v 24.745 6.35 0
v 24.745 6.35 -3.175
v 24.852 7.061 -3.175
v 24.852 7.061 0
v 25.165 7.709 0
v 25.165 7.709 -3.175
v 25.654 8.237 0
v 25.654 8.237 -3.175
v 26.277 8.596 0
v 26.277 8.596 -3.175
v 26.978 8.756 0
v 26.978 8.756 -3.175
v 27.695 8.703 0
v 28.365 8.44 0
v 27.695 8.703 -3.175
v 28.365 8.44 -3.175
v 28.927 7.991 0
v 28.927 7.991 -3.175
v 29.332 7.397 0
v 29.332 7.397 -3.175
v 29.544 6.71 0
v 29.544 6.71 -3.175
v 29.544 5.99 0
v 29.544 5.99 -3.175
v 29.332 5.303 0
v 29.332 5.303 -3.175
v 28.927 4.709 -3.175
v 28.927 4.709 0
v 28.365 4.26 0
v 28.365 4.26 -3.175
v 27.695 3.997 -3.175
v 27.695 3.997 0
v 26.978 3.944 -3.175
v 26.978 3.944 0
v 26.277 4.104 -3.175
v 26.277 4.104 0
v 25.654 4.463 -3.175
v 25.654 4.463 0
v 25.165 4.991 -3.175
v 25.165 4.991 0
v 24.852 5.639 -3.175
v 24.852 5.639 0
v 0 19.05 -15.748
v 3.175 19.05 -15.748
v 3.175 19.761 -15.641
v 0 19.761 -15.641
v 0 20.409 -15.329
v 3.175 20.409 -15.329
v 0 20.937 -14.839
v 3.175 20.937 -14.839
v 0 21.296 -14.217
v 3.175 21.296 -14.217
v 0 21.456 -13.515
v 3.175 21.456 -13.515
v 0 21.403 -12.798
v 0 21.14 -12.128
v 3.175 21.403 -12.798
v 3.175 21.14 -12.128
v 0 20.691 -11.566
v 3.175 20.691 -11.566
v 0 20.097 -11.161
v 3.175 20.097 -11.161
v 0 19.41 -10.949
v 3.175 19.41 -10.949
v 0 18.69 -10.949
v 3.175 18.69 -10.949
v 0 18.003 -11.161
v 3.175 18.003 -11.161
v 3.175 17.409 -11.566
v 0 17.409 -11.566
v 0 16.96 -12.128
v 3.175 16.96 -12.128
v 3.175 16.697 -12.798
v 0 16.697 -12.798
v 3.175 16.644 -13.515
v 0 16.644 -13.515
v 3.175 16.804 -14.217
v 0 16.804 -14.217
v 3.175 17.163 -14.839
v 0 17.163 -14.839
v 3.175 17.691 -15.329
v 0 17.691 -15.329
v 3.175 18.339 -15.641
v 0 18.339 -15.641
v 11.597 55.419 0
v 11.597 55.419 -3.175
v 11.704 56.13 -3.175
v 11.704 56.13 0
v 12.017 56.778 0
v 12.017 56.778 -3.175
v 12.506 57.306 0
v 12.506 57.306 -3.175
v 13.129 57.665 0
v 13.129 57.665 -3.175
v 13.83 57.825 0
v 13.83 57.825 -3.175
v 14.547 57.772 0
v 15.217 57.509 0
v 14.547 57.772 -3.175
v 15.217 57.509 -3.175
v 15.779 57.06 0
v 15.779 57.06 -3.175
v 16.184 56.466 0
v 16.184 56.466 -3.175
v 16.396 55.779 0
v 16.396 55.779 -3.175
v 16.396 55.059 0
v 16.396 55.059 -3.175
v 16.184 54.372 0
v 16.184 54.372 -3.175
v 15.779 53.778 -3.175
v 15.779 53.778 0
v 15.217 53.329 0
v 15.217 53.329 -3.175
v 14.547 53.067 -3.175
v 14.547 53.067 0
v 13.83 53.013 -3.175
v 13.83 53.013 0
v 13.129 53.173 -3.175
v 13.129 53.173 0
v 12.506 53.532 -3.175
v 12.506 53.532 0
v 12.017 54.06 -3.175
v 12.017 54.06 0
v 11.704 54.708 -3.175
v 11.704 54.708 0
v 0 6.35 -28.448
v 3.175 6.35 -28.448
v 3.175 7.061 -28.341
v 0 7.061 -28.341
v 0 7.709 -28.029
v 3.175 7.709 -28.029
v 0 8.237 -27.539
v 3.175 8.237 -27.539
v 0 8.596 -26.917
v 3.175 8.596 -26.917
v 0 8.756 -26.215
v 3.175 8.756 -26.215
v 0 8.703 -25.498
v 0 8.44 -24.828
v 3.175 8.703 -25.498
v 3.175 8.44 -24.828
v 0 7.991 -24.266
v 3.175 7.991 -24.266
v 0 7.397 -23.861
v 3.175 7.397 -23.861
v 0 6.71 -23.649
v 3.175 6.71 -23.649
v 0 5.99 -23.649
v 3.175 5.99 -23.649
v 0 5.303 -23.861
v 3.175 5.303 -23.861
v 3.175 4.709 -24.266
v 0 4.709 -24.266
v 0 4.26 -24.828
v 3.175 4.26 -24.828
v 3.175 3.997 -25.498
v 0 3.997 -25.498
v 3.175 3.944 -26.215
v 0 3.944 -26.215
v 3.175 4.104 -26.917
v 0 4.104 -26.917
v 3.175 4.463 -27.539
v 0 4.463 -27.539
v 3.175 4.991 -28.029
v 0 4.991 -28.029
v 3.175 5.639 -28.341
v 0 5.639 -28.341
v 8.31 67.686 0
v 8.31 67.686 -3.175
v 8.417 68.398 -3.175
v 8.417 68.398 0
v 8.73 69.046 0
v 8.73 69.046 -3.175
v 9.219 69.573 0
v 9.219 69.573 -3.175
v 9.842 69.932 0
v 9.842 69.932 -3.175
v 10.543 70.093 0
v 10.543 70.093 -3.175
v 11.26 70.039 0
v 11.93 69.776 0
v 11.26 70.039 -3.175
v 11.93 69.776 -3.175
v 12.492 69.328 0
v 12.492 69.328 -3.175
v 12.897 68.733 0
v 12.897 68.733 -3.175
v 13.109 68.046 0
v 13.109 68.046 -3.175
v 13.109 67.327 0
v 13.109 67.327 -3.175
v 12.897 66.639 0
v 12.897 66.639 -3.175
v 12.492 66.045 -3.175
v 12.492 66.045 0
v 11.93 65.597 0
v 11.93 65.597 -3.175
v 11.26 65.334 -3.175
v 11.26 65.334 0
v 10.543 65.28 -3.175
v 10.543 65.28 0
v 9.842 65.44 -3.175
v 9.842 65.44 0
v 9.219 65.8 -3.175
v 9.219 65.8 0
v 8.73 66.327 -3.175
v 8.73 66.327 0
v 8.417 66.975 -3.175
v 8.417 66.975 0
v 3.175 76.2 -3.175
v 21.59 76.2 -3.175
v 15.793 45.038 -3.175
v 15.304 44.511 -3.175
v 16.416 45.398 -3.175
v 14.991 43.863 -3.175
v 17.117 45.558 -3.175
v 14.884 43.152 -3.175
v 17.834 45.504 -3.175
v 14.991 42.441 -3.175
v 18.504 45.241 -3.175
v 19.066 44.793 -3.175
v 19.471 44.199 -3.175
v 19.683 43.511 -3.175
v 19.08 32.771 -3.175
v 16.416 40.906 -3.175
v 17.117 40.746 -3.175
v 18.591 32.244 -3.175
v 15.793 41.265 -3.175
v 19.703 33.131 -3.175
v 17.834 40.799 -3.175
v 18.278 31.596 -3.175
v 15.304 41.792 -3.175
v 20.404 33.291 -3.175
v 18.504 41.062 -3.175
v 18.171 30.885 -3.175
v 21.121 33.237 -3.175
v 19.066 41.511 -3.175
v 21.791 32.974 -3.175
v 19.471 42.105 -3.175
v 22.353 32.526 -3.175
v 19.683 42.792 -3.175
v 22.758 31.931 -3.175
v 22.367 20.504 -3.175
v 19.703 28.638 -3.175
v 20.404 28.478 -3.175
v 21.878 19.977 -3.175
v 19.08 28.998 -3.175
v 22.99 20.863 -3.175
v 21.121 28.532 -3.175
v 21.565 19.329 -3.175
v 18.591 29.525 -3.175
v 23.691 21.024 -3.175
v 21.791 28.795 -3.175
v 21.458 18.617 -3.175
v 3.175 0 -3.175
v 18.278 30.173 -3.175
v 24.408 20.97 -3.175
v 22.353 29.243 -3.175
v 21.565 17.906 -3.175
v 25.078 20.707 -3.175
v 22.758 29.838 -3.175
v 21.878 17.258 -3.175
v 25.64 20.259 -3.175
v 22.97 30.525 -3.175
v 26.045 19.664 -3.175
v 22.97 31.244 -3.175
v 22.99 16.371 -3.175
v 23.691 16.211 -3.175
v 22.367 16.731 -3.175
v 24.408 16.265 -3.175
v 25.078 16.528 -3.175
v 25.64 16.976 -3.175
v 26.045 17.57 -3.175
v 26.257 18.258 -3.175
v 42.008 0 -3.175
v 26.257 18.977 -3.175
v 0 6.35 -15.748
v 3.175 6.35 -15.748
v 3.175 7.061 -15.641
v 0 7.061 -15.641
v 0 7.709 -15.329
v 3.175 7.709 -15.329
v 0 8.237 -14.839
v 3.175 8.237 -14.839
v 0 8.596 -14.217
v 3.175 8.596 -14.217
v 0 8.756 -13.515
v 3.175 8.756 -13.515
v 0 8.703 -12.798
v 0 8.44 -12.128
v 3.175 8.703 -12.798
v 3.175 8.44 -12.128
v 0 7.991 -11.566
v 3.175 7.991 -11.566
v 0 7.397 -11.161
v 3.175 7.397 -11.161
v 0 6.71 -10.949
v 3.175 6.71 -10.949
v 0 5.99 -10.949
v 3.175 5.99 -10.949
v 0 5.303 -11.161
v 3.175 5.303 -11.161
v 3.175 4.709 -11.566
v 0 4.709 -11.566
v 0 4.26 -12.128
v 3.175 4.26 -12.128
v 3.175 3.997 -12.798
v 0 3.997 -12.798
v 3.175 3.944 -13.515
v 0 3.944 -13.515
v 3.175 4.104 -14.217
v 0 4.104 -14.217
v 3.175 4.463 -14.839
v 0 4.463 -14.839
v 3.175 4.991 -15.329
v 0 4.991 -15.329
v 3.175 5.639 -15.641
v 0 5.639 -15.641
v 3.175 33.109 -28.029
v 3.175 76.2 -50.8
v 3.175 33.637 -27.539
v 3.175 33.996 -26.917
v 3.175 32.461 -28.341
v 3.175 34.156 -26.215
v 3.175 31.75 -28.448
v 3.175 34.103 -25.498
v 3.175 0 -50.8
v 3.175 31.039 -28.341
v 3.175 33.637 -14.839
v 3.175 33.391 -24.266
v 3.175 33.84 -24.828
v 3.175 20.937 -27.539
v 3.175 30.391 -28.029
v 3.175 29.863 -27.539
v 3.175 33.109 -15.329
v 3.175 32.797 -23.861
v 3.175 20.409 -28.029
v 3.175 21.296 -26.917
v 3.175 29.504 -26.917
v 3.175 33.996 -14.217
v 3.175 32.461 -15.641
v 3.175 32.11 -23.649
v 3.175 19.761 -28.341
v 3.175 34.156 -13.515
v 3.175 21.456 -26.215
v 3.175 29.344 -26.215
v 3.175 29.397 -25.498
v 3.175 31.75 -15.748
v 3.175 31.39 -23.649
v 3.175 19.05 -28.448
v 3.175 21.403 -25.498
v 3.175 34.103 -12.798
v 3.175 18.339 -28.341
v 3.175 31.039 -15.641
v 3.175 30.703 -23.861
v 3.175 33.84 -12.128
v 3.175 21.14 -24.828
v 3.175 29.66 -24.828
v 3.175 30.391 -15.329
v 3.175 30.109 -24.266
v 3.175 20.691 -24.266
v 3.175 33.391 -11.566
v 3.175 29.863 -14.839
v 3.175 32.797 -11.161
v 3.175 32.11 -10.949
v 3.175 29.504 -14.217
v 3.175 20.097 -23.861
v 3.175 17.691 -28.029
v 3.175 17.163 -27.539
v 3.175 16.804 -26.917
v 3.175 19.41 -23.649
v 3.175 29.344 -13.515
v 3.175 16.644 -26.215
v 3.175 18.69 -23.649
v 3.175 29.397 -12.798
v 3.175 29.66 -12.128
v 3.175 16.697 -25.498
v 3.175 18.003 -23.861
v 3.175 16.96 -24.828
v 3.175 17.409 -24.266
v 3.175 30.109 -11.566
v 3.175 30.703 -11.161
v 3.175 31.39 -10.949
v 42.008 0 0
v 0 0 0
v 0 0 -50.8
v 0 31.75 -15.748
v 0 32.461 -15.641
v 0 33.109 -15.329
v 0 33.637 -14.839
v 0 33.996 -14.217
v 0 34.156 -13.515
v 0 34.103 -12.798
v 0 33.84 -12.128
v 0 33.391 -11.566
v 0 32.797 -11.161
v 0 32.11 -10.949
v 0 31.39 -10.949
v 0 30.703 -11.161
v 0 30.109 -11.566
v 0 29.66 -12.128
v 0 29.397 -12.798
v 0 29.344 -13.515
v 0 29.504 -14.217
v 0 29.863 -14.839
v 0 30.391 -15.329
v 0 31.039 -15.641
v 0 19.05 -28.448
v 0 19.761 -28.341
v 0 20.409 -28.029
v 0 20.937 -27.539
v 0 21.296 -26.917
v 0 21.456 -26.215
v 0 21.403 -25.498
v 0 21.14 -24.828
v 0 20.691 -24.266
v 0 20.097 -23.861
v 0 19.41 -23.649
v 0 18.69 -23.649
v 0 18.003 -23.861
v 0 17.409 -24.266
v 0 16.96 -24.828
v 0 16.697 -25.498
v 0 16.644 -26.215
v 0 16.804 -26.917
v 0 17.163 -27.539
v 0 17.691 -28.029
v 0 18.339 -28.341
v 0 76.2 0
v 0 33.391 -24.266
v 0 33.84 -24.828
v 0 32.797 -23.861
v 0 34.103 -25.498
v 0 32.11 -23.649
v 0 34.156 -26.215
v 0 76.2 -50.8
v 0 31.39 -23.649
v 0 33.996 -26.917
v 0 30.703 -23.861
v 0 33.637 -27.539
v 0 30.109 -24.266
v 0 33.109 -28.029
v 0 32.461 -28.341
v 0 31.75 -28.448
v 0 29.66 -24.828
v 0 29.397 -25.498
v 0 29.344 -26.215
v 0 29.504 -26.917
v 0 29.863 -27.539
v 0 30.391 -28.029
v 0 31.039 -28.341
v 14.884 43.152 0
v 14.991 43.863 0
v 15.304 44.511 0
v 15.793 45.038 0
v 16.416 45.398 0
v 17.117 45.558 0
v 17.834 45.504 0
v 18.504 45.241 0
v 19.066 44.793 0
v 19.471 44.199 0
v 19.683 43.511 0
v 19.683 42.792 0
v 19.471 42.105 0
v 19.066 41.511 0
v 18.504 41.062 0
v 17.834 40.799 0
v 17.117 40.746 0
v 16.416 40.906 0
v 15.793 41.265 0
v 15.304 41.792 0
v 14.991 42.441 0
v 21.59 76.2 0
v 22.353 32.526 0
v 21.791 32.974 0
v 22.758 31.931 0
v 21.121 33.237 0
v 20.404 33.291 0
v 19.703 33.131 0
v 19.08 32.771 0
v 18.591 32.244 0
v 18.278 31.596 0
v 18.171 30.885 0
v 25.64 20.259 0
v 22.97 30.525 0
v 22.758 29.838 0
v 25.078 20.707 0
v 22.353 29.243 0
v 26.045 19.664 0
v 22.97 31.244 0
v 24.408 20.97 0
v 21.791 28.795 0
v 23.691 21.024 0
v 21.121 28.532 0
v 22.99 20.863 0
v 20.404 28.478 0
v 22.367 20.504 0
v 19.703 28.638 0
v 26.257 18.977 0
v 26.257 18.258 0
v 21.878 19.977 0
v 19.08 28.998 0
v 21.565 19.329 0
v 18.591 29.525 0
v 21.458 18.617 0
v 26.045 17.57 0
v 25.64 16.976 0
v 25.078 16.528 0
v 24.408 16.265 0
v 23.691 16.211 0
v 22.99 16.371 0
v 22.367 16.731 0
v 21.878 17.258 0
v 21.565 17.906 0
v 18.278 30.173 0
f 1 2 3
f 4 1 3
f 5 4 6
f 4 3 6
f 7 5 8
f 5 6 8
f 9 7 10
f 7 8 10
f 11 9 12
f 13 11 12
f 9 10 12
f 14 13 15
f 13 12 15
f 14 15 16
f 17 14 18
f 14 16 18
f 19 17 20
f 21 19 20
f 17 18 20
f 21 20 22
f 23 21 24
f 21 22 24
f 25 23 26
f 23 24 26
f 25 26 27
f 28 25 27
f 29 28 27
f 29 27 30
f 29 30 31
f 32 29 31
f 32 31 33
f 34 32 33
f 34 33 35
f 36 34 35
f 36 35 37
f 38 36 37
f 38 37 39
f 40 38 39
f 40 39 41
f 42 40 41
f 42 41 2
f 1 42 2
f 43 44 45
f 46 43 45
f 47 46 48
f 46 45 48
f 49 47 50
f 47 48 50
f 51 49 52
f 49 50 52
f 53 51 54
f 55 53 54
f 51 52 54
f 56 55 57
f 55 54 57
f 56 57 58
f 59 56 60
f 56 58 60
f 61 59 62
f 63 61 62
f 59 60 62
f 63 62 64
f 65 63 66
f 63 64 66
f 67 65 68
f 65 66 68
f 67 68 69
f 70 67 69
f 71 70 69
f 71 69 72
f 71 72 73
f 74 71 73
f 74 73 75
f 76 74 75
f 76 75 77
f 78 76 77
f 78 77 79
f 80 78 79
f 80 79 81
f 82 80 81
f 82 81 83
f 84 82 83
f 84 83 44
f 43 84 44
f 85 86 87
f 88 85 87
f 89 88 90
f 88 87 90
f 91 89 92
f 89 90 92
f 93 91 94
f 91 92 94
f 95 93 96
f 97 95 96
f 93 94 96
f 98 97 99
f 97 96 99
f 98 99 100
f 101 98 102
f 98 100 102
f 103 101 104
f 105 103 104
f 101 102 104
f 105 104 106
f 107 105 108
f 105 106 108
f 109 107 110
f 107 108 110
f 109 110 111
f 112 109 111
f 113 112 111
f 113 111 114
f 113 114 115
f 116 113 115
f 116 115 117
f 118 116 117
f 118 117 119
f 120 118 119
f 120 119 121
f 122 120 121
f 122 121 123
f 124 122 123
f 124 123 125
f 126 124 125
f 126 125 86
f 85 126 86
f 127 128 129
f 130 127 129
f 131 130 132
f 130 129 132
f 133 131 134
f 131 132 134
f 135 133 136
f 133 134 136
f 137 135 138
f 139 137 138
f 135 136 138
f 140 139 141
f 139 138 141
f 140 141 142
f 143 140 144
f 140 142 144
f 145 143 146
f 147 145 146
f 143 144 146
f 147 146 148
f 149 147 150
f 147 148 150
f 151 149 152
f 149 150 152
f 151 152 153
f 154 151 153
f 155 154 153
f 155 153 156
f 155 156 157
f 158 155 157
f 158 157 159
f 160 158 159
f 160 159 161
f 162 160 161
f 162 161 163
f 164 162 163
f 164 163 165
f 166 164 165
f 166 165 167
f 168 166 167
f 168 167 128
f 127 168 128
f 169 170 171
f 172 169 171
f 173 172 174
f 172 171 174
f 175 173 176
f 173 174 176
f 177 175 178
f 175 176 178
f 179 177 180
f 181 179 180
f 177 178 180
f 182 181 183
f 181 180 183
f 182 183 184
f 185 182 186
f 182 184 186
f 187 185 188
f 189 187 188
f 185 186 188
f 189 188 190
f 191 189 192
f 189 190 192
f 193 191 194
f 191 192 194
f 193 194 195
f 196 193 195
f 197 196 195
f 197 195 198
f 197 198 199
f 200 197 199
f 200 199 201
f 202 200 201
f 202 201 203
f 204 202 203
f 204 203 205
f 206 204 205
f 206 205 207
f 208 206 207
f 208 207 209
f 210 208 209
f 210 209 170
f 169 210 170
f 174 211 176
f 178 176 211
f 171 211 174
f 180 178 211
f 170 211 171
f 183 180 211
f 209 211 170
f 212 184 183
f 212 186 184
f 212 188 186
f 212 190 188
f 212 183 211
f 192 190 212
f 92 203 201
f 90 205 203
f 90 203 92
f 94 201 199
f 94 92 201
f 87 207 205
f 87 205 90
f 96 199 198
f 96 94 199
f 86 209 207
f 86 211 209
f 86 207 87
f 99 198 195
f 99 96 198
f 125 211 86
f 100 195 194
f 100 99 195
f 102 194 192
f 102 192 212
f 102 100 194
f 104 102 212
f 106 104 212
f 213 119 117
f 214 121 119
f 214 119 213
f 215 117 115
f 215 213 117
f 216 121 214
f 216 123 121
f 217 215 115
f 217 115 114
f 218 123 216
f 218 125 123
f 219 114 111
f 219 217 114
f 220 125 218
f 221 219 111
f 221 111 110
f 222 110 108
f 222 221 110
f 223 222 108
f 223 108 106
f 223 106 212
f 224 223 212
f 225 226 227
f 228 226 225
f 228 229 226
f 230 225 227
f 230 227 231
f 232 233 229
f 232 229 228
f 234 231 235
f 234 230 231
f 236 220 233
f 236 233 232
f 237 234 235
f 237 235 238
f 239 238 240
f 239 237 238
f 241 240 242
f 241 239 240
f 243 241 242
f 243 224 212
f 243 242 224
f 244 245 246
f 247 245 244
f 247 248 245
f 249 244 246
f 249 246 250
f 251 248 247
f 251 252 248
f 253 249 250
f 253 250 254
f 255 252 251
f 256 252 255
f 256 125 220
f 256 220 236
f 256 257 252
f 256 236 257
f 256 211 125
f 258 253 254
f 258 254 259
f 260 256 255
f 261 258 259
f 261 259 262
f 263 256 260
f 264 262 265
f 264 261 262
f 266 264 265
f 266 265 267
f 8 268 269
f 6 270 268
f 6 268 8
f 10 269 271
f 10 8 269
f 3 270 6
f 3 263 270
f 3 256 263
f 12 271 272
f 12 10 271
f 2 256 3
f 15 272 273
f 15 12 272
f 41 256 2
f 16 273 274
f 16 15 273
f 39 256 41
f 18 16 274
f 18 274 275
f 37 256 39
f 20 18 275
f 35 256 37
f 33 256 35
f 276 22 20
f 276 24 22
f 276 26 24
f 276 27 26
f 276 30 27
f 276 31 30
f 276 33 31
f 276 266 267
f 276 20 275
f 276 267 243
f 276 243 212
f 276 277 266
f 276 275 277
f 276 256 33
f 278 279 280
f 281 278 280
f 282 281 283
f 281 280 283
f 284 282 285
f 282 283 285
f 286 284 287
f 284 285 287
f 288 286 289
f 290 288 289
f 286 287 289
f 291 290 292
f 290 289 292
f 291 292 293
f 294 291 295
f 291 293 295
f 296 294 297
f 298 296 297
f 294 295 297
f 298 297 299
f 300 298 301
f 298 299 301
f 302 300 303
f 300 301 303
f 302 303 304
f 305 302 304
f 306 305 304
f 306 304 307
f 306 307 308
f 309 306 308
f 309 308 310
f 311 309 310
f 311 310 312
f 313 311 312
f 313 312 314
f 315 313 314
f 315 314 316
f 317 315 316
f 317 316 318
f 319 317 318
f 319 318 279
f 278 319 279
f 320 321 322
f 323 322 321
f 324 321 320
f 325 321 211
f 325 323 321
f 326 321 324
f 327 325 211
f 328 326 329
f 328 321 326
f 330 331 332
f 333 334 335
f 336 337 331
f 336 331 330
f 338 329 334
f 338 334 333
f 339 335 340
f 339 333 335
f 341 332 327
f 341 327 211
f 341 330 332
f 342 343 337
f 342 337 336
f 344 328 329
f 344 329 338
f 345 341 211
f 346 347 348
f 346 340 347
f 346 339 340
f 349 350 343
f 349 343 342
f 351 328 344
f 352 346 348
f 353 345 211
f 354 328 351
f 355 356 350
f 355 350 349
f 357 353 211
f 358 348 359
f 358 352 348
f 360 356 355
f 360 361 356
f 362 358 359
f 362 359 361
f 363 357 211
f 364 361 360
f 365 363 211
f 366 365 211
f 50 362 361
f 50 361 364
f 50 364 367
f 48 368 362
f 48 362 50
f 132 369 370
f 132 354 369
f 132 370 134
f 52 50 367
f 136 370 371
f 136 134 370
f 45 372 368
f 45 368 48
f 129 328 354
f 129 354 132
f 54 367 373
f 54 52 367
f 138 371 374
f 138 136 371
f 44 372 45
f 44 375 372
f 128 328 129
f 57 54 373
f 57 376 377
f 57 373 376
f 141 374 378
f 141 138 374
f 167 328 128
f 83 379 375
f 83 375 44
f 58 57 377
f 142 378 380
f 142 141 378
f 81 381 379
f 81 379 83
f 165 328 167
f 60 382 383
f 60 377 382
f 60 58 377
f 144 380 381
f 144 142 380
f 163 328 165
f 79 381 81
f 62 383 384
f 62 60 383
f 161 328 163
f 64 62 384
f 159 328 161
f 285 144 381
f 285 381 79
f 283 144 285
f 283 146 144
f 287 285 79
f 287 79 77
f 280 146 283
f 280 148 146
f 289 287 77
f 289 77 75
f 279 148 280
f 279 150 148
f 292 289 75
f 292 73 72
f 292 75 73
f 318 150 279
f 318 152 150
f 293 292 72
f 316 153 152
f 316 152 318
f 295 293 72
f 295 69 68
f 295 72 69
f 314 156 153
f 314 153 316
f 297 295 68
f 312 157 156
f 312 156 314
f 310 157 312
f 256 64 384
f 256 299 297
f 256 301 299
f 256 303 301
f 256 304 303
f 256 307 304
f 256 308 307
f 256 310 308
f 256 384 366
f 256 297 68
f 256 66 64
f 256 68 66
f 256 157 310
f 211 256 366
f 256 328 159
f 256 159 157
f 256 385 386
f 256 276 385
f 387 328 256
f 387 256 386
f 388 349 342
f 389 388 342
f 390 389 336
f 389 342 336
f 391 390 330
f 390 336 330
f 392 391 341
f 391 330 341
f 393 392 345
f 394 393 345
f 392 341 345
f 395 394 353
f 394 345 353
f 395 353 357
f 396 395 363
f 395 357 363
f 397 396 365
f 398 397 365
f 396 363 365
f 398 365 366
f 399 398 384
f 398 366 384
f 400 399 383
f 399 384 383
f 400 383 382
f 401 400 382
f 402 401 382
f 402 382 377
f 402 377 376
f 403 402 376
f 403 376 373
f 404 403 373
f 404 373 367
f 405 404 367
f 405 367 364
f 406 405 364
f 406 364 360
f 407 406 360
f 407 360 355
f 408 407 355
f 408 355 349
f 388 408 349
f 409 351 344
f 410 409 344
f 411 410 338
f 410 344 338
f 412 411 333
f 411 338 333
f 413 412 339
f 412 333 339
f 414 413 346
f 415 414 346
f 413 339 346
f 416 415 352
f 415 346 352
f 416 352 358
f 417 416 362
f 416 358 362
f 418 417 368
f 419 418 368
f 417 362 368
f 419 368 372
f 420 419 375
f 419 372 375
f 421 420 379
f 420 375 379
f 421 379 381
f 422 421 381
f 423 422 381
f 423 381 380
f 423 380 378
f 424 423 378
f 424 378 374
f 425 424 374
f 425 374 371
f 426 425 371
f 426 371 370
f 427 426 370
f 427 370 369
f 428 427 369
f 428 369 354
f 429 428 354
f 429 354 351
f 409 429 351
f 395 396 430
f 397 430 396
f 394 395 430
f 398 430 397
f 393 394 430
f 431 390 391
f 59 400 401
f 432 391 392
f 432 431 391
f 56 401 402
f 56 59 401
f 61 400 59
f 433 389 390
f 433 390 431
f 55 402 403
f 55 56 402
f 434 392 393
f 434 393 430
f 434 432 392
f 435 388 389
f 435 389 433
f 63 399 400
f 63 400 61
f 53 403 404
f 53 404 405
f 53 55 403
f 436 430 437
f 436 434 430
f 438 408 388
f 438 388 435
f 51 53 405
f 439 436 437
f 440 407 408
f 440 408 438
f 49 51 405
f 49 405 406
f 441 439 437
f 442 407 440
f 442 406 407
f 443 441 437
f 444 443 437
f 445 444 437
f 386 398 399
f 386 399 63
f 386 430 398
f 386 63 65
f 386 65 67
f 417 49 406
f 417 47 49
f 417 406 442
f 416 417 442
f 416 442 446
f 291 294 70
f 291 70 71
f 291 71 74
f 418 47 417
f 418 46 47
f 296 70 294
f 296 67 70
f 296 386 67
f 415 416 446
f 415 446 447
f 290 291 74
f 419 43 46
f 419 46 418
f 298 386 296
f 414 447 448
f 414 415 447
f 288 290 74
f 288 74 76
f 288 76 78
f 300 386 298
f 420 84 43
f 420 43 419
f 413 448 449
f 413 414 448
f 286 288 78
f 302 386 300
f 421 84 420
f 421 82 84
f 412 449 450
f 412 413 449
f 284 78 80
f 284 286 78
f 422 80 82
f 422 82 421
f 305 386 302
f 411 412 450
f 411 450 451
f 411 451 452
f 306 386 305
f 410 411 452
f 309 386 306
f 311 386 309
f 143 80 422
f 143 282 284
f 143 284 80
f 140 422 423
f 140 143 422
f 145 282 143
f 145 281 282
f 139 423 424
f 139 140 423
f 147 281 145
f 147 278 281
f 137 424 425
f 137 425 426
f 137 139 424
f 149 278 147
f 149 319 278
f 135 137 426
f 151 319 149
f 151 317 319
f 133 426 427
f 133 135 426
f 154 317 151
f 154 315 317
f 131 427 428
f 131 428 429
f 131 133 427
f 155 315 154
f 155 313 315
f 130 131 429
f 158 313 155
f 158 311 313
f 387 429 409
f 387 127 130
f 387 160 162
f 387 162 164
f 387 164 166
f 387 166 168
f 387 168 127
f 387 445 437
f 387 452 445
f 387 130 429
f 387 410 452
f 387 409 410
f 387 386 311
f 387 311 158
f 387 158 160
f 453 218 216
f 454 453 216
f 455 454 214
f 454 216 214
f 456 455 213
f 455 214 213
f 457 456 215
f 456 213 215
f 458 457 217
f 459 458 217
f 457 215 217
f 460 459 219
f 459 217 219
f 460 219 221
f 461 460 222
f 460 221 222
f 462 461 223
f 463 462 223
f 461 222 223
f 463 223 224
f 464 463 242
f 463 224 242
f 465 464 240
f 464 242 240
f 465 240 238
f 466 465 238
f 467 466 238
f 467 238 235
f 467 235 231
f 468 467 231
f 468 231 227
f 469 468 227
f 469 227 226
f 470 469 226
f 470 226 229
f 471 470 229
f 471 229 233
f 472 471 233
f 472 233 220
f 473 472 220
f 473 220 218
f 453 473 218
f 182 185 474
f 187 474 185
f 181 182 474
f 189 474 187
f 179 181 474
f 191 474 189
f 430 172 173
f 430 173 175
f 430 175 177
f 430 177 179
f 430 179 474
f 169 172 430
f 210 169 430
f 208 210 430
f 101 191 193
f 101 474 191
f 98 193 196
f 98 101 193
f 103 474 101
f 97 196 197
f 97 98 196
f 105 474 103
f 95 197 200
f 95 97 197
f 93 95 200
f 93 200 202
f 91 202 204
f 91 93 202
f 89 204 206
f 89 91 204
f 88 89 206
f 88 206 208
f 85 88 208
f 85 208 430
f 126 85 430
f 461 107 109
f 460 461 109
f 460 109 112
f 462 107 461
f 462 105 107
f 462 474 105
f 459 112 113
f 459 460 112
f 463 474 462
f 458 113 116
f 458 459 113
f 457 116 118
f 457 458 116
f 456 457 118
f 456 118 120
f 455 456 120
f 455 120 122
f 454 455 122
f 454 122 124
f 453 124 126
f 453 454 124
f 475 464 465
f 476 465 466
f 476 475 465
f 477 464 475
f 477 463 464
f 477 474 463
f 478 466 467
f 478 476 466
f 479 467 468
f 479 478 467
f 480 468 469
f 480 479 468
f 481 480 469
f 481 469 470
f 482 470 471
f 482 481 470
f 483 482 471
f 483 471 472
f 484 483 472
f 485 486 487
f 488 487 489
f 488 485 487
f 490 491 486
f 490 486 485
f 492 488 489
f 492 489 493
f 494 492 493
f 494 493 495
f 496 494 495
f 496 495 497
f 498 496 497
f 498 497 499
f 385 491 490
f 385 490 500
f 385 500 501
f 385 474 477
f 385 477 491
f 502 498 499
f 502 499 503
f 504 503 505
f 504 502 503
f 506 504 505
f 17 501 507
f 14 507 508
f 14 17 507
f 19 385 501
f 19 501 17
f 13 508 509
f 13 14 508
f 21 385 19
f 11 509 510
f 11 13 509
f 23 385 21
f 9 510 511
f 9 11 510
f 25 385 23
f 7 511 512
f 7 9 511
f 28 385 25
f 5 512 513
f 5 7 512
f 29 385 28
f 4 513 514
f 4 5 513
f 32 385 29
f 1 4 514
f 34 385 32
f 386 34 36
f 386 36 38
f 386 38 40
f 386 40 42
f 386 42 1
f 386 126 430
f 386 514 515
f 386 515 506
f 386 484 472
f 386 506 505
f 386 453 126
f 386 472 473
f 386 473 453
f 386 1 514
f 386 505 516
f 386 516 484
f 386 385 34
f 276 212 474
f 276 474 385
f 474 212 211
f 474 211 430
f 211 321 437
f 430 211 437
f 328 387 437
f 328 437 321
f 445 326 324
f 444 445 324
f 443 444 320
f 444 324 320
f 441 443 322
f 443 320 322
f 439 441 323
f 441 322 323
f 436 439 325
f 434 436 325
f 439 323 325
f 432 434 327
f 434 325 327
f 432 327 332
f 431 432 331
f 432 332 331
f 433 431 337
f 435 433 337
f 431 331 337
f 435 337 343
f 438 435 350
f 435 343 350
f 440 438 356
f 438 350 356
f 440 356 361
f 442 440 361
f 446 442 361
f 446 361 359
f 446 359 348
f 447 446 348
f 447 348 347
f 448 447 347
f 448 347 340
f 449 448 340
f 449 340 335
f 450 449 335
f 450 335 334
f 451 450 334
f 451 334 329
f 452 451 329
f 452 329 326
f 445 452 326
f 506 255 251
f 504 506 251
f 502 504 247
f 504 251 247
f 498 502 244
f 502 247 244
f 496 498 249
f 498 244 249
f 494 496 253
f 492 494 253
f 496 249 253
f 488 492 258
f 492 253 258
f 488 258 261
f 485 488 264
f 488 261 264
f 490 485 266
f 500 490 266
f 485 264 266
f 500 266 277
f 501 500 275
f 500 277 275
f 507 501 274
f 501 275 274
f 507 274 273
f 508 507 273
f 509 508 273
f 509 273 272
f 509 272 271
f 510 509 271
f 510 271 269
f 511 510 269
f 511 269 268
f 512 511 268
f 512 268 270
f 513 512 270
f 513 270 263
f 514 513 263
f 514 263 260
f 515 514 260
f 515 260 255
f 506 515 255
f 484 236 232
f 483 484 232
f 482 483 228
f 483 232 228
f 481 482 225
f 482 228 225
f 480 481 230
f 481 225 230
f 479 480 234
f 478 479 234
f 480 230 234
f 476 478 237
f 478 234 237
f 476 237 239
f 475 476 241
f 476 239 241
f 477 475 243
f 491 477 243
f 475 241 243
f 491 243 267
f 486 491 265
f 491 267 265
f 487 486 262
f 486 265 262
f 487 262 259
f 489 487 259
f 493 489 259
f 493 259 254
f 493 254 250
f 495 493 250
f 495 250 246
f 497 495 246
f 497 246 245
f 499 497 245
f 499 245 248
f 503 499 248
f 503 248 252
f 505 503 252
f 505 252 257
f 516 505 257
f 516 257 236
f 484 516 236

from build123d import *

# Parameters (mm, degrees)
BOSS_EXTRUDE1_DEPTH = 76.2
SKETCH2_R           = 2.413
CUT_EXTRUDE1_DEPTH  = 104.224128115
SKETCH3_R           = 2.413
CUT_EXTRUDE2_DEPTH  = 100.4739202


with BuildPart() as part:
    # Sketch1 → Boss-Extrude1 (new body)
    with BuildSketch(Plane(origin=(0, 0, 0), x_dir=(1, 0, 0), z_dir=(0, 1, 0))):
        Polygon((0, 0), (0, 50.8), (3.175, 50.8), (3.175, 3.175), (50.8, 3.175), (50.8, 0), align=None)
    extrude(amount=BOSS_EXTRUDE1_DEPTH)

    # Sketch2 → Cut-Extrude1 (cut, through all)
    with BuildSketch(Plane(origin=(0, 0, -3.175), x_dir=(-1, 0, 0), z_dir=(0, 0, -1))):
        with Locations((-27.1582436, 6.35)):
            Circle(SKETCH2_R)
        with Locations((-23.871241727, 18.617257994)):
            Circle(SKETCH2_R)
        with Locations((-20.584239855, 30.884515988)):
            Circle(SKETCH2_R)
        with Locations((-17.297237982, 43.151773982)):
            Circle(SKETCH2_R)
        with Locations((-14.010236109, 55.419031975)):
            Circle(SKETCH2_R)
        with Locations((-10.723234236, 67.686289969)):
            Circle(SKETCH2_R)
        Polygon((-21.59, 76.2), (-50.8, -32.813204089), (-50.8, 76.2), align=None)
    extrude(amount=-CUT_EXTRUDE1_DEPTH, mode=Mode.SUBTRACT)

    # Sketch3 → Cut-Extrude2 (cut, through all)
    with BuildSketch(Plane(origin=(3.175, 0, 0), x_dir=(0, 0, -1), z_dir=(1, 0, 0))):
        with Locations((13.335, 6.35)):
            Circle(SKETCH3_R)
        with Locations((26.035, 6.35)):
            Circle(SKETCH3_R)
        with Locations((13.335, 19.05)):
            Circle(SKETCH3_R)
        with Locations((26.035, 19.05)):
            Circle(SKETCH3_R)
        with Locations((13.335, 31.75)):
            Circle(SKETCH3_R)
        with Locations((26.035, 31.75)):
            Circle(SKETCH3_R)
    extrude(amount=-CUT_EXTRUDE2_DEPTH, mode=Mode.SUBTRACT)


solid = part.part
